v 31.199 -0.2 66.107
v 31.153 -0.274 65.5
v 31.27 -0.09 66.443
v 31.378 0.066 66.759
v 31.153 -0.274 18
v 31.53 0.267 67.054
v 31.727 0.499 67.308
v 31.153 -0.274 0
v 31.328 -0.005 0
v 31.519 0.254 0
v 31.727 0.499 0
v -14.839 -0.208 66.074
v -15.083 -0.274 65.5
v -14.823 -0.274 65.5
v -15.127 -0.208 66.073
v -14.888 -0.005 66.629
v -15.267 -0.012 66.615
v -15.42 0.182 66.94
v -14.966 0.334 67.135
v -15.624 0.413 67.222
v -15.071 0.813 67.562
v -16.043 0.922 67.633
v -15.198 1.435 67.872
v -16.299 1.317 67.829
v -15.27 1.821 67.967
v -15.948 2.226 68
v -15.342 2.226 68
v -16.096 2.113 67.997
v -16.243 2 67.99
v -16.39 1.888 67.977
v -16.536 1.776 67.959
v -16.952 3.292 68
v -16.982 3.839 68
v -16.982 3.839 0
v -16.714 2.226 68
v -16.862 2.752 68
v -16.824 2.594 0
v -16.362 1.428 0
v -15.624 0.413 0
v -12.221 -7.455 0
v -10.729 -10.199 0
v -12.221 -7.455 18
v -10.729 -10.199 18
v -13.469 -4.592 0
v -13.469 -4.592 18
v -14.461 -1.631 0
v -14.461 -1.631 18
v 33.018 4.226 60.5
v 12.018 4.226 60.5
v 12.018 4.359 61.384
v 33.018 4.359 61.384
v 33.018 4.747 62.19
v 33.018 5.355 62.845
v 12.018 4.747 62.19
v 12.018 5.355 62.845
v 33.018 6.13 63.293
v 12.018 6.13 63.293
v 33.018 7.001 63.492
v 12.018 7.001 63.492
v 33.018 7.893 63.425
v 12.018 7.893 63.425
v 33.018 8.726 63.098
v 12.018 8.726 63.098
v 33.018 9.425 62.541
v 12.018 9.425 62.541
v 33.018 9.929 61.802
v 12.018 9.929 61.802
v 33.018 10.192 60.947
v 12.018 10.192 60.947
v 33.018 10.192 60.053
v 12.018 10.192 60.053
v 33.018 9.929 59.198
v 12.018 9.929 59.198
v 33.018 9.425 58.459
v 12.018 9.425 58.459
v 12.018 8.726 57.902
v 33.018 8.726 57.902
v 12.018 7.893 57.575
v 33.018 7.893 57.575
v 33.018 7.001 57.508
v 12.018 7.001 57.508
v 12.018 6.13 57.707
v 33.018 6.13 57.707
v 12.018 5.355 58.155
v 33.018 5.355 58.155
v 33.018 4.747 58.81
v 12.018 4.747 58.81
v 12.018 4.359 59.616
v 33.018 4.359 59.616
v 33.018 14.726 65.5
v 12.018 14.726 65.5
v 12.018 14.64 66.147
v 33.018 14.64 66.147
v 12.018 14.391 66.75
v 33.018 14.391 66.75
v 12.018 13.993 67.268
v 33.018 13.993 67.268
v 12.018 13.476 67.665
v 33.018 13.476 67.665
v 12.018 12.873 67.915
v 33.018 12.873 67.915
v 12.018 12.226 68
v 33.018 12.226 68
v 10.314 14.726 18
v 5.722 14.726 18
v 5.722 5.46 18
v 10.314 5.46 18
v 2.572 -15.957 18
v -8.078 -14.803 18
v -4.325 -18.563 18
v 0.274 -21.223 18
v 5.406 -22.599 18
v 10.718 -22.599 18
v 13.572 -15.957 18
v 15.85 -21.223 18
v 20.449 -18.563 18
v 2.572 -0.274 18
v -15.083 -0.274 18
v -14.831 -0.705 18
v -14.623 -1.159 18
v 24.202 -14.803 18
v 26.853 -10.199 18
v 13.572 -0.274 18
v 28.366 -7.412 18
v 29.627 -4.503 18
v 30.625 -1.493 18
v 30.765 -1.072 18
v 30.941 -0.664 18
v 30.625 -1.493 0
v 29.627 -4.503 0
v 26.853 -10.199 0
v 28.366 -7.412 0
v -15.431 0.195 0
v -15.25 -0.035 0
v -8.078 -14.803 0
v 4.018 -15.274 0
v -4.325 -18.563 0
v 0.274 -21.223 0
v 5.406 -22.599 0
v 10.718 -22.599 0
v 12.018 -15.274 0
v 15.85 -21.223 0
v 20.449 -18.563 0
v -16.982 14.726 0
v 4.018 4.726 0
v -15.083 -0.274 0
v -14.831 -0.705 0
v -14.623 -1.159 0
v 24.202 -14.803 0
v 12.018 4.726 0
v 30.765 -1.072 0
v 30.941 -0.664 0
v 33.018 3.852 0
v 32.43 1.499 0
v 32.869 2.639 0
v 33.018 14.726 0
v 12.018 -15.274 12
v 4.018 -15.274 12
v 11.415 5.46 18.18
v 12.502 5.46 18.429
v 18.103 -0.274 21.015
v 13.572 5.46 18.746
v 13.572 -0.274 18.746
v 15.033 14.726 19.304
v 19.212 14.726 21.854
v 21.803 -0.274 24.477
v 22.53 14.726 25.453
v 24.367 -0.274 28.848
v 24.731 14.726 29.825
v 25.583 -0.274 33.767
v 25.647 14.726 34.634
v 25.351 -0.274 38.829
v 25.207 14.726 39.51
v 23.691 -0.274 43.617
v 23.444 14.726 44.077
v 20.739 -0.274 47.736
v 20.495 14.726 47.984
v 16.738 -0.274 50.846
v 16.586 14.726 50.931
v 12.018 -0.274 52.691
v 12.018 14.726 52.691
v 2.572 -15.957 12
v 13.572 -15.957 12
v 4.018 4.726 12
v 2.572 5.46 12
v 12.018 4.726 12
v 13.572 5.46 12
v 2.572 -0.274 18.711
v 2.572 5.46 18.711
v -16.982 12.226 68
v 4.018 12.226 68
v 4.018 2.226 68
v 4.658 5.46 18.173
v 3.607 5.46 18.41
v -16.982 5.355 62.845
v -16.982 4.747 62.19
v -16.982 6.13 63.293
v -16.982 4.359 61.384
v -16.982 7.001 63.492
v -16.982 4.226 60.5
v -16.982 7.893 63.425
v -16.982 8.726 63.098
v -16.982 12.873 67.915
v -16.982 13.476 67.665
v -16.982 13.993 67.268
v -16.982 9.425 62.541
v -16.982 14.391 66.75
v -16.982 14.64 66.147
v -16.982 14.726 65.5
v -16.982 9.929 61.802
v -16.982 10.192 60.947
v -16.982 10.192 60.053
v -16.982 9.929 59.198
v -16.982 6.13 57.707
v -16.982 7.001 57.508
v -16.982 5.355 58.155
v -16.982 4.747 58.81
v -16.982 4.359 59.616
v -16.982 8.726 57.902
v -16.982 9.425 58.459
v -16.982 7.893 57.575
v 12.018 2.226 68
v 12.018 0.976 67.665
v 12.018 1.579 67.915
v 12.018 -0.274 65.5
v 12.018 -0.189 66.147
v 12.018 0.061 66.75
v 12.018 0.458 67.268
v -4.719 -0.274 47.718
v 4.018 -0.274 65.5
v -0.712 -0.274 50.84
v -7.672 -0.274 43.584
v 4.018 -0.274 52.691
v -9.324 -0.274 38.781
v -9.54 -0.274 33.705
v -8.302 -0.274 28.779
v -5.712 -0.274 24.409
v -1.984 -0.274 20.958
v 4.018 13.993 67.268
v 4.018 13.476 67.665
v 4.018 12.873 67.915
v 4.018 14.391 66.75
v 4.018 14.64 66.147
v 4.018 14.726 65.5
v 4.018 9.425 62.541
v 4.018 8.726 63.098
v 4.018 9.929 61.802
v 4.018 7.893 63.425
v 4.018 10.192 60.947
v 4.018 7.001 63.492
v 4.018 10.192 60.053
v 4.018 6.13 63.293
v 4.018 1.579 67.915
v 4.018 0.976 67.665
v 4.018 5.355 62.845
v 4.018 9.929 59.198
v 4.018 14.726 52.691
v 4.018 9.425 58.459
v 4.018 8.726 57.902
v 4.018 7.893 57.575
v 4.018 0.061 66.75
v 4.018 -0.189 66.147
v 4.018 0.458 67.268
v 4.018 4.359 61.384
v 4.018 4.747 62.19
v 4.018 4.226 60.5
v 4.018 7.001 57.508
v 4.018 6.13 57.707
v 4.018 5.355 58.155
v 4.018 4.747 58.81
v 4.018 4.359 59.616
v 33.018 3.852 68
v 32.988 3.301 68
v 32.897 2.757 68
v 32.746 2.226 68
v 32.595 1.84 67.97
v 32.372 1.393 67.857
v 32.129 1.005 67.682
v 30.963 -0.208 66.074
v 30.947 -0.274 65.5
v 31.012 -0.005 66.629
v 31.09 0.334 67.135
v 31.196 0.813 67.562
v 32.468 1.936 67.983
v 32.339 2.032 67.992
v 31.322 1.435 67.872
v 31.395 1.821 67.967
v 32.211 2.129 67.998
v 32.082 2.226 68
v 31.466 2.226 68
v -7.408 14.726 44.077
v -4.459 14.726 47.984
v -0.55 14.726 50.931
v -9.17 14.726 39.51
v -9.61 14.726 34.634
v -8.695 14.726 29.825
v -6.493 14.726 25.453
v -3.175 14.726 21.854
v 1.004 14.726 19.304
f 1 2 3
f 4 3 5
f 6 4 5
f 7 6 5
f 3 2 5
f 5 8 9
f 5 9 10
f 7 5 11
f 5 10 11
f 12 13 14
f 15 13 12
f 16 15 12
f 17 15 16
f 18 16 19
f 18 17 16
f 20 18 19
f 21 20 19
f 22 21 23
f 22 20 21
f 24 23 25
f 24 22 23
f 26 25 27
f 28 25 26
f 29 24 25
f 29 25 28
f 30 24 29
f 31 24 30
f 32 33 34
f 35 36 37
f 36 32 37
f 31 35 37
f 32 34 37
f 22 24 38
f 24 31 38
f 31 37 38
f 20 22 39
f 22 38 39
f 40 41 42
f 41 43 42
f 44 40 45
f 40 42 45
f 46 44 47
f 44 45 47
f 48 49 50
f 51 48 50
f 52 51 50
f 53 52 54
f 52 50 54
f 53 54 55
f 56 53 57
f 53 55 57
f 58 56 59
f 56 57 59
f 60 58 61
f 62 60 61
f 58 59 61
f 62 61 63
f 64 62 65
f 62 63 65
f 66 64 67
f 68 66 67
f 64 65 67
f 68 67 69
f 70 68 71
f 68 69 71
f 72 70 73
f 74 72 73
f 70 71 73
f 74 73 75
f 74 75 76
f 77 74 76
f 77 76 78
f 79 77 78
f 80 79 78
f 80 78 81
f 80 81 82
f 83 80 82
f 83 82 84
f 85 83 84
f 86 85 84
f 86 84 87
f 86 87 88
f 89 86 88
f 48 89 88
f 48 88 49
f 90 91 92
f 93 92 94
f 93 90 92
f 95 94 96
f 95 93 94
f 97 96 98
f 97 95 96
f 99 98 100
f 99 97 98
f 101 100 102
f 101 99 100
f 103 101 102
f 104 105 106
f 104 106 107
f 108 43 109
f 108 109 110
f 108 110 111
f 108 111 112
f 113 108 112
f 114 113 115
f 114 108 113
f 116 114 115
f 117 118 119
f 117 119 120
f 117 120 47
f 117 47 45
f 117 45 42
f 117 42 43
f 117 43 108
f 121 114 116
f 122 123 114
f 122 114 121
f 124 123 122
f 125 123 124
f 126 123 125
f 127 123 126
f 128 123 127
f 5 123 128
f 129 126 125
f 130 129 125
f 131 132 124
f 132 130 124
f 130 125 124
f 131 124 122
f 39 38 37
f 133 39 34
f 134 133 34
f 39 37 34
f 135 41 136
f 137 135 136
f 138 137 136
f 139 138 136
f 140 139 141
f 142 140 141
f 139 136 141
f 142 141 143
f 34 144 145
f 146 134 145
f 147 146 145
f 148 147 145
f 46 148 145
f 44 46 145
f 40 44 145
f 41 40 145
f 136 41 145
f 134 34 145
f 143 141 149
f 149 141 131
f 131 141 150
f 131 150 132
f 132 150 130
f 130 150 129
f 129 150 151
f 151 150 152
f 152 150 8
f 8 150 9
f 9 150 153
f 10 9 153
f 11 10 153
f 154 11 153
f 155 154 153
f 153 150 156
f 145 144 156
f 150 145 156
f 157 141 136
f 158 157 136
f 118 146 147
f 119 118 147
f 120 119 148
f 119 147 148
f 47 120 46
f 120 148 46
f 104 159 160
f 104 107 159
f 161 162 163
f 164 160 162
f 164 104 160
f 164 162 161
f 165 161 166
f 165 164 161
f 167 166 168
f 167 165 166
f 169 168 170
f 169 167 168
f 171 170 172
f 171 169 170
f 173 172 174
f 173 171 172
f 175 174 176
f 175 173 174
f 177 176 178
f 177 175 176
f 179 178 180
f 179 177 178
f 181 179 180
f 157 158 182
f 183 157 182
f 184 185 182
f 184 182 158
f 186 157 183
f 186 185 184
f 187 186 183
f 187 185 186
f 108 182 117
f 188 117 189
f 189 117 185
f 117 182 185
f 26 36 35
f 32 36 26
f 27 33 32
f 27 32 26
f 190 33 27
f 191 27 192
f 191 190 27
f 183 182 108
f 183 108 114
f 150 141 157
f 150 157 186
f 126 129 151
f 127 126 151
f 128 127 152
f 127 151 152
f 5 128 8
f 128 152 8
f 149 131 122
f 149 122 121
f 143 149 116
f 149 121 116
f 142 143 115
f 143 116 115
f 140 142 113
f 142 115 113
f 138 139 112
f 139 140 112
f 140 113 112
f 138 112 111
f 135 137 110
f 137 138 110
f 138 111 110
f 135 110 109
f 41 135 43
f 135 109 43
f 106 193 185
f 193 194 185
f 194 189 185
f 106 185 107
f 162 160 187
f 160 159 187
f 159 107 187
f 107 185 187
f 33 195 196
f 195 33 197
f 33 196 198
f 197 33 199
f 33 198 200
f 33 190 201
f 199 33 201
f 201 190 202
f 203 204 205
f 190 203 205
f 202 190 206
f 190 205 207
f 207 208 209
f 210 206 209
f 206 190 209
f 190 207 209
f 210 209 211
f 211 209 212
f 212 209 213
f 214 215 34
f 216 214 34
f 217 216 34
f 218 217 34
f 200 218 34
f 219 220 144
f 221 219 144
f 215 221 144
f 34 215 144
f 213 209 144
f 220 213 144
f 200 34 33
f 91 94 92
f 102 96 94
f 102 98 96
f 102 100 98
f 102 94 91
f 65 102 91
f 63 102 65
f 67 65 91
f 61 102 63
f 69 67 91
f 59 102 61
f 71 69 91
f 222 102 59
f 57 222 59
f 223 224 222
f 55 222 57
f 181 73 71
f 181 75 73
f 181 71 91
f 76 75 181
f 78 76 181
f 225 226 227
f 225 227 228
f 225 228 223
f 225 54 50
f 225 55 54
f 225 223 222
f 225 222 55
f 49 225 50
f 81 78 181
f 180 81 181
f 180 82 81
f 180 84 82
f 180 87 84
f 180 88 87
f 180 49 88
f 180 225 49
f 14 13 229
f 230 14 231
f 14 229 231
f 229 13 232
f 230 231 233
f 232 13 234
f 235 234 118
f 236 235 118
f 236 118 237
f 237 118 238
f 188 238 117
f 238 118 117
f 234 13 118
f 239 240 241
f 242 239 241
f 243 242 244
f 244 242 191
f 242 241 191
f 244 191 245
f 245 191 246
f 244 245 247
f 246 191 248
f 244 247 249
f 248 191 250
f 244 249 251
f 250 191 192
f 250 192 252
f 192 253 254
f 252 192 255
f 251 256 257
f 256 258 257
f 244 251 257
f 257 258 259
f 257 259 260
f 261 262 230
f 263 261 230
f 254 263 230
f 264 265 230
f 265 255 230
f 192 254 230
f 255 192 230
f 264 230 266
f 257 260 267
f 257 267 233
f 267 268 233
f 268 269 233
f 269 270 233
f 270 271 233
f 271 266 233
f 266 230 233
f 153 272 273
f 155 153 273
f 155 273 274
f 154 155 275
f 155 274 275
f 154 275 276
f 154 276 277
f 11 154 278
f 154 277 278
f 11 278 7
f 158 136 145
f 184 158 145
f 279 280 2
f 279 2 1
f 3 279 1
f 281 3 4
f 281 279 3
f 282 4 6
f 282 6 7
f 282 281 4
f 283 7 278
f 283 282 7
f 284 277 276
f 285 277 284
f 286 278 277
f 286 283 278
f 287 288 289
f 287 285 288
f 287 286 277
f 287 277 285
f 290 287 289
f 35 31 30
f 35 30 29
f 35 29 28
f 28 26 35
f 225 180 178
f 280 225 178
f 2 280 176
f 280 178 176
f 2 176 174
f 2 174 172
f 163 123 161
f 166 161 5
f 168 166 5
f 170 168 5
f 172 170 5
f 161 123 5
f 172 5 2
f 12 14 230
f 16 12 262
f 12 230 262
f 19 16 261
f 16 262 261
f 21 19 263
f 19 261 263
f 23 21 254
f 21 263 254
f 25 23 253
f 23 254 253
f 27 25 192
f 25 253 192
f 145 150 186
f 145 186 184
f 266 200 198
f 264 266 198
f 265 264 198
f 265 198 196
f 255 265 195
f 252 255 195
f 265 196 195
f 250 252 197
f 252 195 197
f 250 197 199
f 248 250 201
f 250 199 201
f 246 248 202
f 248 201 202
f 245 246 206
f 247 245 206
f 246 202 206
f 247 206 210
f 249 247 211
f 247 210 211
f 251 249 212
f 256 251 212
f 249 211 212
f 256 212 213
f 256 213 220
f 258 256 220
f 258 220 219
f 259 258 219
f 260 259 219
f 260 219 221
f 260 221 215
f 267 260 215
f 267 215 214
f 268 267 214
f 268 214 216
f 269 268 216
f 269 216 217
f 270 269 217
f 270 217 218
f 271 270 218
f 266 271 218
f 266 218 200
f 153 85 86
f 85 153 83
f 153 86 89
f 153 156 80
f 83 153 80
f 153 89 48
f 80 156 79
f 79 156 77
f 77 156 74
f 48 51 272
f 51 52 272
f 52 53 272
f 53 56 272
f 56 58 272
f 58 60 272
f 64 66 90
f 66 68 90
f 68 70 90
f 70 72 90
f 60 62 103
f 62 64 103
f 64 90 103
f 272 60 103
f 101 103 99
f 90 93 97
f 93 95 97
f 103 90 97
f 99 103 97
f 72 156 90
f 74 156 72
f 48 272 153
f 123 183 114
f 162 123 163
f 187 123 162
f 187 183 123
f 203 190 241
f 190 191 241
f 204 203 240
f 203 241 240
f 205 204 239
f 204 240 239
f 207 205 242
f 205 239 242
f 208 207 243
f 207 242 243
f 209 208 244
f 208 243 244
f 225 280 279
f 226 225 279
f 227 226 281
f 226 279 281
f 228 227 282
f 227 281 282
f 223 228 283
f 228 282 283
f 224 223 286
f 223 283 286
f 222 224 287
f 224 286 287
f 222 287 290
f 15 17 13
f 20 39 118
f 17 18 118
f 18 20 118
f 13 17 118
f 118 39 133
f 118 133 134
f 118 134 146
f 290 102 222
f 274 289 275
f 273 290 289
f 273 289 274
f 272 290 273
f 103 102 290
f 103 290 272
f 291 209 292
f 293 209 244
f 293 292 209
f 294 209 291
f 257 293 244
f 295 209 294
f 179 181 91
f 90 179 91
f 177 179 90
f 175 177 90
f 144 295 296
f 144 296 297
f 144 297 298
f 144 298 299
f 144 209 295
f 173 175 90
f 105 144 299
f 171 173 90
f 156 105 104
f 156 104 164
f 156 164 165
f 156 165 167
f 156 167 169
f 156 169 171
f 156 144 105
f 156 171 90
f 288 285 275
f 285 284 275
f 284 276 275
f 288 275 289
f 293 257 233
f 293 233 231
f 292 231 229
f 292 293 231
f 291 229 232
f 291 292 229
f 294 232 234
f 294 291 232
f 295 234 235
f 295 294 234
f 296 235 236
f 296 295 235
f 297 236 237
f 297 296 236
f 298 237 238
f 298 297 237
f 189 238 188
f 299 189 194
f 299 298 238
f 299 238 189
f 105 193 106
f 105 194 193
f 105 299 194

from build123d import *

# Parameters (mm, degrees)
SKETCH1_W               = 55
SKETCH1_H               = 40
BOSS_EXTRUDE1_DEPTH     = 18
SKETCH2_W               = 55
SKETCH2_H               = 15
BOSS_EXTRUDE2_DEPTH     = 50
CUT_EXTRUDE1_START      = -15
CUT_EXTRUDE1_DEPTH      = 15
SKETCH4_W               = 8
SKETCH4_H               = 40.233753348
CUT_EXTRUDE2_DEPTH      = 50
SKETCH6_R               = 3
CUT_EXTRUDE3_DEPTH      = 62
SKETCH7_W               = 8
SKETCH7_H               = 20
CUT_EXTRUDE4_DEPTH      = 18
CUT_EXTRUDE5_DEPTH      = 6
CUT_EXTRUDE5_DEPTH_BACK = 6
SKETCH8_W               = 11
SKETCH8_H               = 21.417406175
FILLET1_R               = 2.5
CUT_EXTRUDE6_DEPTH      = 67.335088131
CUT_EXTRUDE6_DEPTH_BACK = 67.335088131
CUT_EXTRUDE7_DEPTH      = 61
CUT_EXTRUDE8_DEPTH      = 39
FILLET2_R               = 20
CUT_EXTRUDE9_DEPTH      = 80.705724129
CUT_EXTRUDE9_DEPTH_BACK = 80.705724129
FILLET4_DEPTH           = 68
FILLET4_2_DEPTH         = 18
FILLET4_START           = -18
FILLET4_3_DEPTH         = 52
FILLET5_R               = 5


with BuildPart() as part:
    # Sketch1 → Boss-Extrude1 (new body)
    with BuildSketch(Plane.XY):
        with Locations((8.018292683, -5.274390244)):
            Rectangle(SKETCH1_W, SKETCH1_H)
    extrude(amount=BOSS_EXTRUDE1_DEPTH)

    # Sketch2 → Boss-Extrude2 (add)
    with BuildSketch(Plane.XY.offset(18)):
        with Locations((8.018292683, 7.225609756)):
            Rectangle(SKETCH2_W, SKETCH2_H)
    extrude(amount=BOSS_EXTRUDE2_DEPTH)

    # Cut-Extrude1: read off the stored shape, not the designer's step
    # Cut-Extrude1 outline → Cut-Extrude1 (cut)
    with BuildSketch(Plane(origin=(0, -0.274390244, 0), x_dir=(-1, 0, 0), z_dir=(0, -1, 0)).offset(CUT_EXTRUDE1_START)):
        with BuildLine():
            ThreePointArc((-10.314485184, -18), (-8.018292683, -53.15), (-5.722100182, -18))
            Line((-5.722100182, -18), (-10.314485184, -18))
        make_face()
    extrude(amount=CUT_EXTRUDE1_DEPTH, mode=Mode.SUBTRACT)

    # Sketch4 → Cut-Extrude2 (cut)
    with BuildSketch(Plane(origin=(0, -0.274390244, 0), x_dir=(-1, 0, 0), z_dir=(0, -1, 0))):
        with Locations((-8.018292683, -53.15)):
            Rectangle(SKETCH4_W, SKETCH4_H)
    extrude(amount=-CUT_EXTRUDE2_DEPTH, mode=Mode.SUBTRACT)

    # Sketch6 → Cut-Extrude3 (cut)
    with BuildSketch(Plane.ZY.offset(19.481707317)):
        with Locations(Location((60.5, 7.225609756, 0), (0, 0, 270))):
            Circle(SKETCH6_R)
    extrude(amount=-CUT_EXTRUDE3_DEPTH, mode=Mode.SUBTRACT)

    # Sketch7 → Cut-Extrude4 (cut)
    with BuildSketch(Plane(origin=(0, 0, 0), x_dir=(-1, 0, 0), z_dir=(0, 0, -1))):
        with Locations((-8.018292683, -5.274390244)):
            Rectangle(SKETCH7_W, SKETCH7_H)
    extrude(amount=-CUT_EXTRUDE4_DEPTH, mode=Mode.SUBTRACT)

    # Sketch8 → Cut-Extrude5 (cut, two sides: drawn at the far end of the back side and taken through both)
    with BuildSketch(Plane.XY.offset(18).offset(-CUT_EXTRUDE5_DEPTH_BACK)):
        with Locations((8.071503624, -5.248749455)):
            Rectangle(SKETCH8_W, SKETCH8_H)
    extrude(amount=CUT_EXTRUDE5_DEPTH + CUT_EXTRUDE5_DEPTH_BACK, mode=Mode.SUBTRACT)

    # Fillet1
    fillet1_edges = [part.edges().sort_by_distance(p)[0] for p in [
        (35.518292683, -12.774390244, 18),
        (-19.481707317, -12.774390244, 18),
        (-19.481707317, -0.274390244, 43),
        (35.518292683, -0.274390244, 43),
        (-7.731707317, -0.274390244, 68),
        (23.768292683, 14.725609756, 68),
        (8.018292683, -25.274390244, 18),
        (23.768292683, -0.274390244, 68),
        (-7.731707317, 14.725609756, 68),
        (-19.481707317, 14.725609756, 34),
        (35.518292683, 14.725609756, 34),
    ]]
    fillet(fillet1_edges, radius=FILLET1_R)

    # Sketch10 → Cut-Extrude6 (cut, two sides: drawn at the far end of the back side and taken through both)
    with BuildSketch(Plane.XY.offset(18).offset(-CUT_EXTRUDE6_DEPTH_BACK)):
        with BuildLine():
            ThreePointArc((-3.438146554, -22.774390244), (-11.4271438, -17.219826727), (-16.981707317, -9.230829481))
            Line((-16.981707317, -9.230829481), (-16.981707317, -22.774390244))
            Line((-16.981707317, -22.774390244), (-3.438146554, -22.774390244))
        make_face()
        with BuildLine():
            ThreePointArc((-16.981707317, -9.230829481), (-18.849438892, -3.637409944), (-19.481707317, 2.225609756))
            Line((-19.481707317, 2.225609756), (-19.481707317, -25.274390244))
            Line((-19.481707317, -25.274390244), (8.018292683, -25.274390244))
            ThreePointArc((8.018292683, -25.274390244), (2.155272983, -24.642121819), (-3.438146554, -22.774390244))
            Line((-3.438146554, -22.774390244), (-16.981707317, -22.774390244))
            Line((-16.981707317, -22.774390244), (-16.981707317, -9.230829481))
        make_face()
        with BuildLine():
            ThreePointArc((19.47473192, -22.774390244), (13.881312383, -24.642121819), (8.018292683, -25.274390244))
            Line((8.018292683, -25.274390244), (35.518292683, -25.274390244))
            Line((35.518292683, -25.274390244), (35.518292683, 2.225609756))
            ThreePointArc((35.518292683, 2.225609756), (34.886024258, -3.637409944), (33.018292683, -9.230829481))
            Line((33.018292683, -9.230829481), (33.018292683, -22.774390244))
            Line((33.018292683, -22.774390244), (19.47473192, -22.774390244))
        make_face()
        with BuildLine():
            ThreePointArc((33.018292683, -9.230829481), (27.463729166, -17.219826727), (19.47473192, -22.774390244))
            Line((19.47473192, -22.774390244), (33.018292683, -22.774390244))
            Line((33.018292683, -22.774390244), (33.018292683, -9.230829481))
        make_face()
    extrude(amount=CUT_EXTRUDE6_DEPTH + CUT_EXTRUDE6_DEPTH_BACK, mode=Mode.SUBTRACT)

    # Sketch11 → Cut-Extrude7 (cut)
    with BuildSketch(Plane(origin=(0, 14.725609756, 0), x_dir=(1, 0, 0), z_dir=(0, 1, 0))):
        Polygon((-16.981707317, -68), (-16.981707317, 0), (-29.965472326, 0), (-29.965472326, -73.975211298), (-16.981707317, -73.975211298), align=None)
    extrude(amount=-CUT_EXTRUDE7_DEPTH, mode=Mode.SUBTRACT)

    # Sketch12 → Cut-Extrude8 (cut)
    with BuildSketch(Plane(origin=(0, 14.725609756, 0), x_dir=(1, 0, 0), z_dir=(0, 1, 0))):
        Polygon((33.018292683, -34), (33.018292683, -69.603278632), (51.263623859, -69.603278632), (51.263623859, -68), (51.263623859, 5.657942166), (48.966322657, 5.657942166), (33.018292683, 5.657942166), align=None)
    extrude(amount=-CUT_EXTRUDE8_DEPTH, mode=Mode.SUBTRACT)

    # Fillet2
    fillet2_edges = [part.edges().sort_by_distance(p)[0] for p in [
        (-16.981707317, -9.230829481, 9),
        (33.018292683, -9.230829481, 9),
    ]]
    fillet(fillet2_edges, radius=FILLET2_R)

    # Sketch13 → Cut-Extrude9 (cut, two sides: drawn at the far end of the back side and taken through both)
    with BuildSketch(Plane(origin=(0, 0, 0), x_dir=(-1, 0, 0), z_dir=(0, 0, -1)).offset(-CUT_EXTRUDE9_DEPTH_BACK)):
        with BuildLine():
            Line((15.409844247, 2.637038383), (21.378631307, -1.925347001))
            Line((21.378631307, -1.925347001), (18.152736662, -25.695120221))
            Line((18.152736662, -25.695120221), (-4.693551269, -34.090790667))
            Line((-4.693551269, -34.090790667), (-38.816552793, -29.459816409))
            Line((-38.816552793, -29.459816409), (-43.750527307, -6.539564186))
            Line((-43.750527307, -6.539564186), (-31.534000974, 2.637038383))
            ThreePointArc((-31.534000974, 2.637038383), (-29.812131381, -4.006457809), (-26.853089861, -10.198787729))
            ThreePointArc((-26.853089861, -10.198787729), (-8.062078363, -22.773516814), (10.728933135, -10.198787729))
            ThreePointArc((10.728933135, -10.198787729), (13.687974655, -4.006457809), (15.409844247, 2.637038383))
        make_face()
    extrude(amount=CUT_EXTRUDE9_DEPTH + CUT_EXTRUDE9_DEPTH_BACK, mode=Mode.SUBTRACT)

    # Fillet4: read off the stored shape, not the designer's step
    # Fillet4 outline → Fillet4 (add)
    with BuildSketch(Plane.XY):
        with BuildLine():
            ThreePointArc((31.153095191, -0.274390244), (31.967368862, 0.746702465), (33.018292683, 1.52209337))
            Line((33.018292683, 1.52209337), (31.534000974, 2.637038383))
            ThreePointArc((31.534000974, 2.637038383), (31.270593615, 1.175225559), (30.946719887, -0.274390244))
            Line((30.946719887, -0.274390244), (31.153095191, -0.274390244))
        make_face()
        with BuildLine():
            ThreePointArc((-16.981707317, 1.435547188), (-15.921170685, 0.70393524), (-15.08279533, -0.274390244))
            Line((-15.08279533, -0.274390244), (-14.82256316, -0.274390244))
            ThreePointArc((-14.82256316, -0.274390244), (-15.146436888, 1.175225559), (-15.409844247, 2.637038383))
            Line((-15.409844247, 2.637038383), (-16.981707317, 1.435547188))
        make_face()
    extrude(amount=FILLET4_DEPTH)

    # Fillet4 2 outline → Fillet4 2 (add)
    with BuildSketch(Plane.XY):
        with BuildLine():
            ThreePointArc((30.624925491, -1.492895434), (30.848374458, -0.866028928), (31.153095191, -0.274390244))
            Line((31.153095191, -0.274390244), (30.946719887, -0.274390244))
            ThreePointArc((30.946719887, -0.274390244), (30.791189941, -0.885060274), (30.624925491, -1.492895434))
        make_face()
        with BuildLine():
            ThreePointArc((-15.08279533, -0.274390244), (-14.721255817, -0.92925432), (-14.461460233, -1.63072708))
            ThreePointArc((-14.461460233, -1.63072708), (-14.648665519, -0.954330135), (-14.82256316, -0.274390244))
            Line((-14.82256316, -0.274390244), (-15.08279533, -0.274390244))
        make_face()
    extrude(amount=FILLET4_2_DEPTH)

    # Fillet4 3 outline → Fillet4 3 (cut)
    with BuildSketch(Plane.YZ.offset(FILLET4_START)):
        with BuildLine():
            Line((-0.274390244, 68), (-0.274390244, 65.5))
            ThreePointArc((-0.274390244, 65.5), (0.457842803, 67.267766953), (2.225609756, 68))
            Line((2.225609756, 68), (-0.274390244, 68))
        make_face()
    extrude(amount=FILLET4_3_DEPTH, mode=Mode.SUBTRACT)

    # Fillet5
    # the kernel refuses this fillet: 5 mm, written as the material it takes off along each edge
    with BuildSketch(Plane(origin=(33.018292683, 1.52209337, 73.723867582), x_dir=(0, 1, 0), z_dir=(0, 0, -1))) as fillet5_piece_1:
        with BuildLine():
            CenterArc((2.329958397, -5), FILLET5_R, 90, 42.117992045)
            ThreePointArc((-1.023339511, -1.291173616), (-0.45812273, -0.688026327), (0, 0))
            Line((0, 0), (2.329958397, 0))
        make_face()
    extrude(amount=79.548763574, mode=Mode.SUBTRACT)
    with BuildSketch(Plane(origin=(-16.981707317, 1.435547188, -6.007429576), x_dir=(0, 1, 0), z_dir=(0, 0, 1))) as fillet5_piece_2:
        with BuildLine():
            CenterArc((2.40297183, -5), FILLET5_R, 90, 43.236885439)
            ThreePointArc((-1.022109439, -1.357361081), (-0.452973163, -0.72241666), (0, 0))
            Line((0, 0), (2.40297183, 0))
        make_face()
    extrude(amount=79.886736286, mode=Mode.SUBTRACT)


solid = part.part
